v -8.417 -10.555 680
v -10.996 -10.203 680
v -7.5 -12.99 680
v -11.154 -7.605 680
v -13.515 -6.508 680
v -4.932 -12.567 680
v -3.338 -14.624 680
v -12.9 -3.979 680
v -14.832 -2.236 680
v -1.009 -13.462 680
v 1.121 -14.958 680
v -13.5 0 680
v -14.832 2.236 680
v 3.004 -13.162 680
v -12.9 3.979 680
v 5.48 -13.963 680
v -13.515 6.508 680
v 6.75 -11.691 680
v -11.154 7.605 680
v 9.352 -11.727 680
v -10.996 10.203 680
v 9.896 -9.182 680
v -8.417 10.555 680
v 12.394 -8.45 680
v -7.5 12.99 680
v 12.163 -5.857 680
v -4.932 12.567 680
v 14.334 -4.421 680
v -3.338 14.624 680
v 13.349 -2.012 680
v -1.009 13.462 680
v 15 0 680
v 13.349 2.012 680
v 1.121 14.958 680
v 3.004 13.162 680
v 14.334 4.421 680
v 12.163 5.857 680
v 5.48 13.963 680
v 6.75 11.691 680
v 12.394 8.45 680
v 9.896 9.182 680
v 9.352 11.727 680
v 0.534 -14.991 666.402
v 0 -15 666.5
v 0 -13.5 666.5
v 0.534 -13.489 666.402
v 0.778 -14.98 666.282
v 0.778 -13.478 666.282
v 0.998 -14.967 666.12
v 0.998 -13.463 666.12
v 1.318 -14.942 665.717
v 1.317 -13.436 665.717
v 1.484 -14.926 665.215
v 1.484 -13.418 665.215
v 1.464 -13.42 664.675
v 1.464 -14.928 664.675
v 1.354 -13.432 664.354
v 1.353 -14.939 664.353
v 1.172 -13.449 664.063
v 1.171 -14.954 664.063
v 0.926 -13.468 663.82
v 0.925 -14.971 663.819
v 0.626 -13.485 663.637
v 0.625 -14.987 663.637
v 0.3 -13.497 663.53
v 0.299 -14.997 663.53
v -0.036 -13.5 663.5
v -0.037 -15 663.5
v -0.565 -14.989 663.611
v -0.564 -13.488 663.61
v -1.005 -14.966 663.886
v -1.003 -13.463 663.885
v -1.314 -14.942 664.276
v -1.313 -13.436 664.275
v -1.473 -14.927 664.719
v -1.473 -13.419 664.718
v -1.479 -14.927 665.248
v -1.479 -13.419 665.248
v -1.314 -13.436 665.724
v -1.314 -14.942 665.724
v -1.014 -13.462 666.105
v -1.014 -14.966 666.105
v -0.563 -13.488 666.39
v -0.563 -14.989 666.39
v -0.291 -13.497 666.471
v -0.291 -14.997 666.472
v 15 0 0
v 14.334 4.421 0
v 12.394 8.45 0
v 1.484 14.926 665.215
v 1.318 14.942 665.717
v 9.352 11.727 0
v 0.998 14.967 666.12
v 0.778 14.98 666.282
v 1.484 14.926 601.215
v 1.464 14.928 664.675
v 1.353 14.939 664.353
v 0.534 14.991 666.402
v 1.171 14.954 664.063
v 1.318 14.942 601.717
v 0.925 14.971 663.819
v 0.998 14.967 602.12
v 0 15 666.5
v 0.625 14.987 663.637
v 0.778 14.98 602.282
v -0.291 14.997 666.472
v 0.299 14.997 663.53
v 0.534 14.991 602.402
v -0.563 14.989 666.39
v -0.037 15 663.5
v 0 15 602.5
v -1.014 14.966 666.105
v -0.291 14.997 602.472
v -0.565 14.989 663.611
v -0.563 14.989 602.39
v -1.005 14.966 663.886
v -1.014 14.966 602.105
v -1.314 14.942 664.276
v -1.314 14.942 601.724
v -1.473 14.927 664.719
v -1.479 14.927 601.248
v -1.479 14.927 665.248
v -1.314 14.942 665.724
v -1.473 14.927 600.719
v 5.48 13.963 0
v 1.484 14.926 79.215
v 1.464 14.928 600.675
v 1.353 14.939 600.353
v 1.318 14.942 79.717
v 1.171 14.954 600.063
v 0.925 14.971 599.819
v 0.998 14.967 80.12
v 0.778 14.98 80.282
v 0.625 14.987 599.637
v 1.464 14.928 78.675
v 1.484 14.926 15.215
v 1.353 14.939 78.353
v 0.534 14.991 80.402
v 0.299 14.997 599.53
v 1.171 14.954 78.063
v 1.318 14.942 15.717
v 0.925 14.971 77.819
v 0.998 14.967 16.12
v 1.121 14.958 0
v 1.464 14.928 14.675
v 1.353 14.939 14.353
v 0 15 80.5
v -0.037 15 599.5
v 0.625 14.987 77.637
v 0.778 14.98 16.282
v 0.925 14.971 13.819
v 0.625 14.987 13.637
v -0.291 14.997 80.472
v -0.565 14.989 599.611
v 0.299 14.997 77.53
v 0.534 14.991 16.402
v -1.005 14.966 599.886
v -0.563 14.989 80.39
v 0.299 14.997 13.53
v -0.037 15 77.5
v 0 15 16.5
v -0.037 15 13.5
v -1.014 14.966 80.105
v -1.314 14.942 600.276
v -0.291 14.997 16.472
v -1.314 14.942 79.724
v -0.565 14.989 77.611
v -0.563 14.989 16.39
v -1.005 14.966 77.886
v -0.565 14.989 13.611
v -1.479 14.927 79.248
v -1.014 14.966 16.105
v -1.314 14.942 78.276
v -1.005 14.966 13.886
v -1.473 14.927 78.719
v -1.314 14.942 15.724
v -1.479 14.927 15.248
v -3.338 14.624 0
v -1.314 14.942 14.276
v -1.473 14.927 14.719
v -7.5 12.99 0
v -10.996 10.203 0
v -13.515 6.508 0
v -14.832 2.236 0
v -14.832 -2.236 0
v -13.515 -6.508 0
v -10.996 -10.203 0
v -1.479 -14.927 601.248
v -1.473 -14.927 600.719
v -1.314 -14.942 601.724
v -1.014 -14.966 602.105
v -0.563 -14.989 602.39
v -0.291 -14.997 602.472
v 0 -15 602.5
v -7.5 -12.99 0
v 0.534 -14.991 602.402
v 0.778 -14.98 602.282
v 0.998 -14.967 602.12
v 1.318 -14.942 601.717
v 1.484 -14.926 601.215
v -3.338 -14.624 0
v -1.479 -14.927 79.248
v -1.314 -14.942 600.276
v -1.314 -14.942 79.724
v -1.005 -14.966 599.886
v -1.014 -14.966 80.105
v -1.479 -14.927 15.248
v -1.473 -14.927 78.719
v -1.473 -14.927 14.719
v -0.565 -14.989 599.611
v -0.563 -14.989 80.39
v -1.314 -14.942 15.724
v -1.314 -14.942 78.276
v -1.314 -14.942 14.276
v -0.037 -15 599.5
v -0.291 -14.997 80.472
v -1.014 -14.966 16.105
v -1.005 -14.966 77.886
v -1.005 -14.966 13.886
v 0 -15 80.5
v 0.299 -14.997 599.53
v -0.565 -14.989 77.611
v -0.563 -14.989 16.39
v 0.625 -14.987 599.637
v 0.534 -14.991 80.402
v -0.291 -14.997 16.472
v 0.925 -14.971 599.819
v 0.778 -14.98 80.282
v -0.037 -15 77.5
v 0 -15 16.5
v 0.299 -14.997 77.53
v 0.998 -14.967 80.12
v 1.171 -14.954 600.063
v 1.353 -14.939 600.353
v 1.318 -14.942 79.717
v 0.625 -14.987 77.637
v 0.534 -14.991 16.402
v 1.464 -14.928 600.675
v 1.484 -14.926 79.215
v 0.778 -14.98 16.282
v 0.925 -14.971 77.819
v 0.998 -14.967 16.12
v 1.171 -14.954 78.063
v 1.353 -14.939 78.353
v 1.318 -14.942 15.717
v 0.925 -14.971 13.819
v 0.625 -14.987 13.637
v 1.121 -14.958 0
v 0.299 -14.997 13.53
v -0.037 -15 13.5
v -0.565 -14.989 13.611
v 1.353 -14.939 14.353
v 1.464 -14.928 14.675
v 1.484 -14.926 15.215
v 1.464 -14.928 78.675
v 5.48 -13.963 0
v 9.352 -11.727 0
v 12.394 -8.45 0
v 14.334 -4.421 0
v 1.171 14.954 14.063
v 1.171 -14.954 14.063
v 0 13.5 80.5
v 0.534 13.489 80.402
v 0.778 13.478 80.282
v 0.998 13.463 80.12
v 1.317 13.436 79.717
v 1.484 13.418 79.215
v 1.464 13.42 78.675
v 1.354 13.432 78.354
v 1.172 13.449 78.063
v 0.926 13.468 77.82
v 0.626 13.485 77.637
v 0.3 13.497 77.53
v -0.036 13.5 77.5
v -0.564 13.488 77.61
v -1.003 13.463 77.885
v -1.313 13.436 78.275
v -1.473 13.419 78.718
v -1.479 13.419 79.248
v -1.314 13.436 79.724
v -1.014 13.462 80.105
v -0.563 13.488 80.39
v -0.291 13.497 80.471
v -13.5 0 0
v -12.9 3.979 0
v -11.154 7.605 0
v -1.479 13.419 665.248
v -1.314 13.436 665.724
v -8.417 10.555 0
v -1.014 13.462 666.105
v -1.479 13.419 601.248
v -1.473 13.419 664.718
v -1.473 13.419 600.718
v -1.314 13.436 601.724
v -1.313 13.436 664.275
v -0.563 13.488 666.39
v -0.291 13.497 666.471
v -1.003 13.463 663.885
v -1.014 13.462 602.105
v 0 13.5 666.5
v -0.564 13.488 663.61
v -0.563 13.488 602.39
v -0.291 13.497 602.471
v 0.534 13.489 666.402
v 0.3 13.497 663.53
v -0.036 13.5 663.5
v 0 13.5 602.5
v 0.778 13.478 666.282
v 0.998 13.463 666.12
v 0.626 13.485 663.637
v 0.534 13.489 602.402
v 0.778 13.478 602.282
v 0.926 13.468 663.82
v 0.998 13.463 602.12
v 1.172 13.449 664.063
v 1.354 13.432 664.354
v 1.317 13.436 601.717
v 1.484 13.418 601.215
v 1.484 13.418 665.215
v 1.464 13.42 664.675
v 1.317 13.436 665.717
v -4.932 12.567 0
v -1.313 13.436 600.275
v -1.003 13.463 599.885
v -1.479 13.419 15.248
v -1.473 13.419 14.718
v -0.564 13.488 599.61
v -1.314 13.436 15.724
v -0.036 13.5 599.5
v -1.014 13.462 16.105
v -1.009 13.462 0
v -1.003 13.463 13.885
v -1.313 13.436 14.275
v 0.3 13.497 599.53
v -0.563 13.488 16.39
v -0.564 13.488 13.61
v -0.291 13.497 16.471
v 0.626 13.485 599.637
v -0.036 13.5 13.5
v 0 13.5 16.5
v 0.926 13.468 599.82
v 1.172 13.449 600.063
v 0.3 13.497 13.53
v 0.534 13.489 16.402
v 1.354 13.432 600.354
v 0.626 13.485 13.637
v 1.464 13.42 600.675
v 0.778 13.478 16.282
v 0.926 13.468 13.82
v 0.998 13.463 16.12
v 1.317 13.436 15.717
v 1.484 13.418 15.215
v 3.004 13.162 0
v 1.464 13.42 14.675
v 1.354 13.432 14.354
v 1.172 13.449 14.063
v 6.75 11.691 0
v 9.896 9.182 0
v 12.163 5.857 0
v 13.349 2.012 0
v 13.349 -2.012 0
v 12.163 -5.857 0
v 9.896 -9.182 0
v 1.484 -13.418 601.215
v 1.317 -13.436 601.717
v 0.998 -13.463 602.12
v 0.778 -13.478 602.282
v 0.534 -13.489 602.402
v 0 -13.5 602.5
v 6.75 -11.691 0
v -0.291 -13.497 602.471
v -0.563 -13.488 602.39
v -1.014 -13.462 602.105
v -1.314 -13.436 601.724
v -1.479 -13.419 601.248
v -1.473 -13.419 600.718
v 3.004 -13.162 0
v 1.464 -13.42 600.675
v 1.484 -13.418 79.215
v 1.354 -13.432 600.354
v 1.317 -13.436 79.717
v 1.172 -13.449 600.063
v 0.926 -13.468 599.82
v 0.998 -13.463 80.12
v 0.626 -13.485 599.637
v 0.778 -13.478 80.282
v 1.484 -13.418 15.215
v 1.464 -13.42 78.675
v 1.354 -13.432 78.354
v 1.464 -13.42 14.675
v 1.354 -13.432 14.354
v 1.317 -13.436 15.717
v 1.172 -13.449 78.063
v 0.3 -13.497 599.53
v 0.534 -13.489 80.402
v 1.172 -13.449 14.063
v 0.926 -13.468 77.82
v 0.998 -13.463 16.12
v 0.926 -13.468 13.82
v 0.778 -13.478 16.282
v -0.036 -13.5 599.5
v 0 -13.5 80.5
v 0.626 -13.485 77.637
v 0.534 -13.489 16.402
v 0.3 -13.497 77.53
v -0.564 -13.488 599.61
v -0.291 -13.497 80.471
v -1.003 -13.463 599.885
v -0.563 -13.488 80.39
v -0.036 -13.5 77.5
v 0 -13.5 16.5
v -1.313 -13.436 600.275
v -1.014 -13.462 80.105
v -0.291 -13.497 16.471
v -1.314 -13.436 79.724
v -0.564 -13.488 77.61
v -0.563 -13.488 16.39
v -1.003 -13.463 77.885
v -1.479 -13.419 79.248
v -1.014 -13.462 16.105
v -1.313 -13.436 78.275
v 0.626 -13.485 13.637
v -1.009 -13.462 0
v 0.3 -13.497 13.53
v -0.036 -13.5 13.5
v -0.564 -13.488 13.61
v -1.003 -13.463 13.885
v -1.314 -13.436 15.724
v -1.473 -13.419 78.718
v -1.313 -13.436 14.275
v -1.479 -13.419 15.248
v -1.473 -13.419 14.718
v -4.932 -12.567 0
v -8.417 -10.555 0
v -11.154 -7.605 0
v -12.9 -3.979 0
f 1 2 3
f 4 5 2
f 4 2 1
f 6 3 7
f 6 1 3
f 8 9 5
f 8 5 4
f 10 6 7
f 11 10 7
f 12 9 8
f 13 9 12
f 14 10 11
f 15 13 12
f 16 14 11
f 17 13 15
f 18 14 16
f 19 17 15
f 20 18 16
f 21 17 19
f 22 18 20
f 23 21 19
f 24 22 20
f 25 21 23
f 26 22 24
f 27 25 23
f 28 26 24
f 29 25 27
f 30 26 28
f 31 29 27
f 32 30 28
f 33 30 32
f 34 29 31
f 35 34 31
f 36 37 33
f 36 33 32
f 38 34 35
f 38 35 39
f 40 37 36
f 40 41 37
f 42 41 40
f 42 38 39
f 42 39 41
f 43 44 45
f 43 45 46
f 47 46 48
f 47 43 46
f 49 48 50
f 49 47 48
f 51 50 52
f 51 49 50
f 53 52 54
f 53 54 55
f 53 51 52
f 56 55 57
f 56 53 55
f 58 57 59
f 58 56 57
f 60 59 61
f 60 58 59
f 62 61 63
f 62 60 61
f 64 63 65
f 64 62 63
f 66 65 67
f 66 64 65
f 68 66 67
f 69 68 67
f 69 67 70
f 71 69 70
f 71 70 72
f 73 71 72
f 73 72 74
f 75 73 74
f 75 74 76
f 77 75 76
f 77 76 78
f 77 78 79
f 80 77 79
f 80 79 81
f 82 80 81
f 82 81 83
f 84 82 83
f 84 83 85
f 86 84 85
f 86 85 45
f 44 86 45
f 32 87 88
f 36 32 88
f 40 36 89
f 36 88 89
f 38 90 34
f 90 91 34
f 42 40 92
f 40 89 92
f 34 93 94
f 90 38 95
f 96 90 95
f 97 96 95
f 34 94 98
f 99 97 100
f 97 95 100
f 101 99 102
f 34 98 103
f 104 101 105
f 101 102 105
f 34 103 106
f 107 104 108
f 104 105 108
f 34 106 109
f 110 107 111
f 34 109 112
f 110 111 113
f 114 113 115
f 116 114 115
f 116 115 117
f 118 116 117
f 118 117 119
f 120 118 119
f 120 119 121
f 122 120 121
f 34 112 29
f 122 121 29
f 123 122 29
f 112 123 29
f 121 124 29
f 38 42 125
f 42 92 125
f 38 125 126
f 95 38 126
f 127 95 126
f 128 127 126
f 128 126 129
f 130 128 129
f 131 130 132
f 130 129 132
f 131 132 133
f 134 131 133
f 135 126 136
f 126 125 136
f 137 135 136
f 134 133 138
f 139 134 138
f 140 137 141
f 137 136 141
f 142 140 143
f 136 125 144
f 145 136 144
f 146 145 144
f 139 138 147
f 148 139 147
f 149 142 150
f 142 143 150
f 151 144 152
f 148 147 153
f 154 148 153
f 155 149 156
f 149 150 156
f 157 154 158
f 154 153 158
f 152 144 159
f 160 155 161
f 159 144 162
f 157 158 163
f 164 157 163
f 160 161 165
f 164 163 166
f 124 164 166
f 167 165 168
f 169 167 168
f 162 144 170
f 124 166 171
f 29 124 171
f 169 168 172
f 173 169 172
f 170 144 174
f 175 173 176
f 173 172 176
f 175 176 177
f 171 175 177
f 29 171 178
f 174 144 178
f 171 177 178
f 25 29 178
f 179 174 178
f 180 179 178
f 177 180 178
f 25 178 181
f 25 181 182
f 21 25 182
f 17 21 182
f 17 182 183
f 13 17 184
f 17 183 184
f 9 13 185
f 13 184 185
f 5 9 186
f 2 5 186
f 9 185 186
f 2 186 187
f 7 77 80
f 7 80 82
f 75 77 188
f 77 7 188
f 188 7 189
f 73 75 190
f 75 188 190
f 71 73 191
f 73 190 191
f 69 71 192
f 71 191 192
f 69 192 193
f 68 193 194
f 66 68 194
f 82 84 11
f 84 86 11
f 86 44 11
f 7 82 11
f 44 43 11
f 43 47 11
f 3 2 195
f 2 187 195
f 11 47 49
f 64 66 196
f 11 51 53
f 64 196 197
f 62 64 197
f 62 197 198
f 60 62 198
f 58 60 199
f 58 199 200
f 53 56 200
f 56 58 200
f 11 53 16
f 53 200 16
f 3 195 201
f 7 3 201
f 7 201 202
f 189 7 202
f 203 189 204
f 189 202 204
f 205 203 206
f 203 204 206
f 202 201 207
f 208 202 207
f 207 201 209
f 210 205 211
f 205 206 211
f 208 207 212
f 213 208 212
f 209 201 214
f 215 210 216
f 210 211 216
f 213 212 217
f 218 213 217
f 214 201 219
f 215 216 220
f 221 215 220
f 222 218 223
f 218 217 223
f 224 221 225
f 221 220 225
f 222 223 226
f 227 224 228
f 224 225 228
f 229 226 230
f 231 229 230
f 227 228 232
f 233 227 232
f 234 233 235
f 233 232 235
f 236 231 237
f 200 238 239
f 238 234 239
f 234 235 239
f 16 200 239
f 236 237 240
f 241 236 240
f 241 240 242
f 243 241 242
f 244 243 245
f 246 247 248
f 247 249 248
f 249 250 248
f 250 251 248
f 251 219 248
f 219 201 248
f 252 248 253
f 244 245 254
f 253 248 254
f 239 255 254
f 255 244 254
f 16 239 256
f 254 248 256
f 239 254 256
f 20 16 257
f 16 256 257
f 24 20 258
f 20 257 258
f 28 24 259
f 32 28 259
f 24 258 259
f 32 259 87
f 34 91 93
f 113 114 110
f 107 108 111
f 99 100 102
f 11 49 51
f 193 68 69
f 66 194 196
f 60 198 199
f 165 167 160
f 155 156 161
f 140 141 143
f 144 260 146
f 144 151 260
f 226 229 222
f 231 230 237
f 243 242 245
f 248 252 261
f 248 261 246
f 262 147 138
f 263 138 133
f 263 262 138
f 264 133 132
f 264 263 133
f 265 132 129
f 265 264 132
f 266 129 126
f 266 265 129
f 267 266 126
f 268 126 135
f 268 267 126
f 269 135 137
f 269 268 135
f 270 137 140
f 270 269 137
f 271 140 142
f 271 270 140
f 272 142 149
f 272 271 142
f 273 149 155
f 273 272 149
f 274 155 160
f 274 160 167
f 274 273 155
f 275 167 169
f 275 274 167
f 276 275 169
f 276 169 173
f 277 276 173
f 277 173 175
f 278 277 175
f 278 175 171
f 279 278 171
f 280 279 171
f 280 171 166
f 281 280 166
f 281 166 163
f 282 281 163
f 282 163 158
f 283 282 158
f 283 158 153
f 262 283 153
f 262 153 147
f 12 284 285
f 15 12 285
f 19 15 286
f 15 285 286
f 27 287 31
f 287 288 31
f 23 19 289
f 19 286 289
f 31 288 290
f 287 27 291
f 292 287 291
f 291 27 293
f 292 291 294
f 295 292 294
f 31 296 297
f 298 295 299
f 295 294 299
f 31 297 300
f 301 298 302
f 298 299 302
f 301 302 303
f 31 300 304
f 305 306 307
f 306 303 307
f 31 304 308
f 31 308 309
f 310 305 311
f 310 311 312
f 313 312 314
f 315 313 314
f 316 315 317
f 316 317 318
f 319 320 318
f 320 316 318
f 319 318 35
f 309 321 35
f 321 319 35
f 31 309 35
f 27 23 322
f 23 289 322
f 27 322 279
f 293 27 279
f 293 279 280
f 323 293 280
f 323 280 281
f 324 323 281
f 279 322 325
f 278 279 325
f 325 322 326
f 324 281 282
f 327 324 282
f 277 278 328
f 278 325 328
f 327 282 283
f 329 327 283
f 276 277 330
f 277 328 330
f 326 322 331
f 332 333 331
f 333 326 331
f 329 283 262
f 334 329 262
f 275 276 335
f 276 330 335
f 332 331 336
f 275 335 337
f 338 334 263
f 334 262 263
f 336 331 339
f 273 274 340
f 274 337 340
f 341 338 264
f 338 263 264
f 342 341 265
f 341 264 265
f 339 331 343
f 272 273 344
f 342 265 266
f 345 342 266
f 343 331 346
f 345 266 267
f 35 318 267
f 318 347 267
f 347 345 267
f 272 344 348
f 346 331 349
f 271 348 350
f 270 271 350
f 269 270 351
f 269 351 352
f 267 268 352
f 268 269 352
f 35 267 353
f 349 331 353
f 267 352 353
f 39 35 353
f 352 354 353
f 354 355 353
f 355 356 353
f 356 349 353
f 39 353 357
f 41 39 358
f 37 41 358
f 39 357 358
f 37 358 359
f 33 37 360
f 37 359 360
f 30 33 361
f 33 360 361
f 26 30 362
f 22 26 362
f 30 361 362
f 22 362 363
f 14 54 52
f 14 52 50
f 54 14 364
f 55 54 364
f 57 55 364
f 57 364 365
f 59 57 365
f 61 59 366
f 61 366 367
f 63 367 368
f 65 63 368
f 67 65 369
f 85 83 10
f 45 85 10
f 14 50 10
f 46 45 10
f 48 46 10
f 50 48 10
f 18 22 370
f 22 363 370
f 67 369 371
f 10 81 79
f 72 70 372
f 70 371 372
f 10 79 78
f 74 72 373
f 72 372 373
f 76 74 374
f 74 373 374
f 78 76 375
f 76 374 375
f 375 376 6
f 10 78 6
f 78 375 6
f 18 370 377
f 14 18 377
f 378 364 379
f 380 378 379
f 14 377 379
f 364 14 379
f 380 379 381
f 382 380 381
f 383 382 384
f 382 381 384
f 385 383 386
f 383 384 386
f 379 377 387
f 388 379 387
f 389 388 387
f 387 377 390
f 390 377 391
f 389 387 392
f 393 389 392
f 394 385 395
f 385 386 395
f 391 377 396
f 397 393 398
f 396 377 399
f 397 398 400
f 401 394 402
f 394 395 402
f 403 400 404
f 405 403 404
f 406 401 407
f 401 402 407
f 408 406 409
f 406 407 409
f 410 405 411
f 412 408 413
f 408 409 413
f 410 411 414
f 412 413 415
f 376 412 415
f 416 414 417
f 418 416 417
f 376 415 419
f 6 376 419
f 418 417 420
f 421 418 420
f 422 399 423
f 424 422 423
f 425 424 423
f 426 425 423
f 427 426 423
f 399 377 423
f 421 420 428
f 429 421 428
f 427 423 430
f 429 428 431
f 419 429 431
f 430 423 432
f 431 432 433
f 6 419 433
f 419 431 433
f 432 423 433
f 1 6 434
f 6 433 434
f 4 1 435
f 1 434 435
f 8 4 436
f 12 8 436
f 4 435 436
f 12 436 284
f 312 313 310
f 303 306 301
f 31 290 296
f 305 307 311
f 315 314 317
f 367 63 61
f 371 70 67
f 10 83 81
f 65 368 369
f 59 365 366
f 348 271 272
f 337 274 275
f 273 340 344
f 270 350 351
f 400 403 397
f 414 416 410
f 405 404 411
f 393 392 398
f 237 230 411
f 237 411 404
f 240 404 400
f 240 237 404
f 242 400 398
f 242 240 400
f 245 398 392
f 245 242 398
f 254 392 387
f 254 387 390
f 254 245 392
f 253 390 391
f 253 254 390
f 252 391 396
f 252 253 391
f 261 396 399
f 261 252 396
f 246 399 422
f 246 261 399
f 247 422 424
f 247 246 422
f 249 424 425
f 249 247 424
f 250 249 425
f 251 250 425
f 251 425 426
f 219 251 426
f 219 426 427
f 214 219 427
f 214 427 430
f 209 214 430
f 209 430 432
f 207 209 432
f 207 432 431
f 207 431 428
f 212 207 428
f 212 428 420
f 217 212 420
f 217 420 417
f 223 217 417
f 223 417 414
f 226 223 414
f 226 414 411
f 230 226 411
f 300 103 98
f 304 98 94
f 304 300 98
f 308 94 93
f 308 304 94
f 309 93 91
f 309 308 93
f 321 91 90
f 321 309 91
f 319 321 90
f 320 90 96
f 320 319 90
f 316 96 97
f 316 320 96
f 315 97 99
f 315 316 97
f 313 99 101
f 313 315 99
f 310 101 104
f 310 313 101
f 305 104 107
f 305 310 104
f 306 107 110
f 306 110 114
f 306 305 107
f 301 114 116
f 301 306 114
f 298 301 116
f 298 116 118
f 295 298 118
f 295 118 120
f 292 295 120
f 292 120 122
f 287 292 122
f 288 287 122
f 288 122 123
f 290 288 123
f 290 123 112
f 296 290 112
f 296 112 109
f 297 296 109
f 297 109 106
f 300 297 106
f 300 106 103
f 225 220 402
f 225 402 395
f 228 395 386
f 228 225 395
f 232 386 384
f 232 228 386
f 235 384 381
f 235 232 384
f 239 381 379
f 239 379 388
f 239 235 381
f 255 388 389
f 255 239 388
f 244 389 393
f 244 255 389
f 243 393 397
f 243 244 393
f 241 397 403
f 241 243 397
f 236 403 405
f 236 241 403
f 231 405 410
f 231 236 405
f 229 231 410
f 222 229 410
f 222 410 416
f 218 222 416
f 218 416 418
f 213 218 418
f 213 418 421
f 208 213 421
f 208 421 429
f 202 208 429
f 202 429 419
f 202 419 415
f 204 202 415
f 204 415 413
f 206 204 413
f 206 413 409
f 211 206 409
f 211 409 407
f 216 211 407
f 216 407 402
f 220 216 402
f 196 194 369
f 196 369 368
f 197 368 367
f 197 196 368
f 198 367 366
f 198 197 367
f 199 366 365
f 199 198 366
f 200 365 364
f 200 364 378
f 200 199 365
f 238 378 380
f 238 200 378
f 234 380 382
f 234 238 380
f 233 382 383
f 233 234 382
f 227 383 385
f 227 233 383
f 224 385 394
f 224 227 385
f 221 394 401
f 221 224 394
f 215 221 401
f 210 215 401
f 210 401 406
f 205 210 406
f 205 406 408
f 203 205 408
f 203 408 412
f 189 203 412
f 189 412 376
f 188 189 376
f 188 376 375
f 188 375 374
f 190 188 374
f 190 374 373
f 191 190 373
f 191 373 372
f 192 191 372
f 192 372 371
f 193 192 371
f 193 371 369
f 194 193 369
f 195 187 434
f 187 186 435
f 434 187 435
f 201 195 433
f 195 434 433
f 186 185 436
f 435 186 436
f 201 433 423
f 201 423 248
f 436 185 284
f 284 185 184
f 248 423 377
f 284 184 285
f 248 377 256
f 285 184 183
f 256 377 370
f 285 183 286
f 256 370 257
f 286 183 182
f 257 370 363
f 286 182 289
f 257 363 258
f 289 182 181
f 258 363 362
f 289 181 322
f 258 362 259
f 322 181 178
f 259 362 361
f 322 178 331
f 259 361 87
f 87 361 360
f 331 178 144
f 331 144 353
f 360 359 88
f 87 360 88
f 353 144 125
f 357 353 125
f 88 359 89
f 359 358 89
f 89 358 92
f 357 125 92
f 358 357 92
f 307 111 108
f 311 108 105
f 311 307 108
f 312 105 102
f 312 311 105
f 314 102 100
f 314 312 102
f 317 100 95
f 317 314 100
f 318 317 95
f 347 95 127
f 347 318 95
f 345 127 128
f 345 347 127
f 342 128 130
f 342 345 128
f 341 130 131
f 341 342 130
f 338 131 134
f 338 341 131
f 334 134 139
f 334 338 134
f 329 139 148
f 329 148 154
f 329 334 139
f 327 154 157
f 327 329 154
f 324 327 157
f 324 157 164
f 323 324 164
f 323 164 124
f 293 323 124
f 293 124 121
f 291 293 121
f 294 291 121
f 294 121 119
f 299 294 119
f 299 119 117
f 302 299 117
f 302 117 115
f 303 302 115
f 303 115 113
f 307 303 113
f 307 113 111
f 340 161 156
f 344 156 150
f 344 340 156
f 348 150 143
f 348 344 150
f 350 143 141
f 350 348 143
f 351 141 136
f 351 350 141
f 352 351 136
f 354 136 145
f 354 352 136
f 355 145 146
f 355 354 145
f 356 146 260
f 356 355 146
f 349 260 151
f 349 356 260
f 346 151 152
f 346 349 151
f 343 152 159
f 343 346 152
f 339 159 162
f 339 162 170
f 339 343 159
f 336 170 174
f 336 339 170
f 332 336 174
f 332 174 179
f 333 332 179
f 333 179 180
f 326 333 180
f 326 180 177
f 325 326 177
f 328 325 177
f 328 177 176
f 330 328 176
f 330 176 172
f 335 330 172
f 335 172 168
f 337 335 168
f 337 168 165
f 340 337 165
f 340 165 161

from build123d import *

# Parameters (mm, degrees)
SKETCH1_R               = 15
BOSS_EXTRUDE1_DEPTH     = 680
SKETCH2_R               = 13.5
CUT_EXTRUDE1_DEPTH      = 681.33080189
CUT_EXTRUDE2_DEPTH      = 681.33080189
CUT_EXTRUDE2_DEPTH_BACK = 681.33080189
SKETCH3_R               = 1.5


with BuildPart() as part:
    # Sketch1 → Boss-Extrude1 (new body)
    with BuildSketch(Plane.XY):
        Circle(SKETCH1_R)
    extrude(amount=BOSS_EXTRUDE1_DEPTH)

    # Sketch2 → Cut-Extrude1 (cut, through all)
    with BuildSketch(Plane(origin=(0, 0, 0), x_dir=(-1, 0, 0), z_dir=(0, 0, -1))):
        Circle(SKETCH2_R)
    extrude(amount=-CUT_EXTRUDE1_DEPTH, mode=Mode.SUBTRACT)

    # Sketch3 → Cut-Extrude2 (cut, two sides: drawn at the far end of the back side and taken through both)
    with BuildSketch(Plane(origin=(0, 0, 0), x_dir=(1, 0, 0), z_dir=(0, 1, 0)).offset(-CUT_EXTRUDE2_DEPTH_BACK)):
        with Locations(Location((0, -15, 0), (0, 0, 270))):
            Circle(SKETCH3_R)
        with Locations(Location((0, -665, 0), (0, 0, 270))):
            Circle(SKETCH3_R)
        with Locations(Location((0, -79, 0), (0, 0, 270))):
            Circle(SKETCH3_R)
        with Locations(Location((0, -601, 0), (0, 0, 270))):
            Circle(SKETCH3_R)
    extrude(amount=CUT_EXTRUDE2_DEPTH + CUT_EXTRUDE2_DEPTH_BACK, mode=Mode.SUBTRACT)


solid = part.part
